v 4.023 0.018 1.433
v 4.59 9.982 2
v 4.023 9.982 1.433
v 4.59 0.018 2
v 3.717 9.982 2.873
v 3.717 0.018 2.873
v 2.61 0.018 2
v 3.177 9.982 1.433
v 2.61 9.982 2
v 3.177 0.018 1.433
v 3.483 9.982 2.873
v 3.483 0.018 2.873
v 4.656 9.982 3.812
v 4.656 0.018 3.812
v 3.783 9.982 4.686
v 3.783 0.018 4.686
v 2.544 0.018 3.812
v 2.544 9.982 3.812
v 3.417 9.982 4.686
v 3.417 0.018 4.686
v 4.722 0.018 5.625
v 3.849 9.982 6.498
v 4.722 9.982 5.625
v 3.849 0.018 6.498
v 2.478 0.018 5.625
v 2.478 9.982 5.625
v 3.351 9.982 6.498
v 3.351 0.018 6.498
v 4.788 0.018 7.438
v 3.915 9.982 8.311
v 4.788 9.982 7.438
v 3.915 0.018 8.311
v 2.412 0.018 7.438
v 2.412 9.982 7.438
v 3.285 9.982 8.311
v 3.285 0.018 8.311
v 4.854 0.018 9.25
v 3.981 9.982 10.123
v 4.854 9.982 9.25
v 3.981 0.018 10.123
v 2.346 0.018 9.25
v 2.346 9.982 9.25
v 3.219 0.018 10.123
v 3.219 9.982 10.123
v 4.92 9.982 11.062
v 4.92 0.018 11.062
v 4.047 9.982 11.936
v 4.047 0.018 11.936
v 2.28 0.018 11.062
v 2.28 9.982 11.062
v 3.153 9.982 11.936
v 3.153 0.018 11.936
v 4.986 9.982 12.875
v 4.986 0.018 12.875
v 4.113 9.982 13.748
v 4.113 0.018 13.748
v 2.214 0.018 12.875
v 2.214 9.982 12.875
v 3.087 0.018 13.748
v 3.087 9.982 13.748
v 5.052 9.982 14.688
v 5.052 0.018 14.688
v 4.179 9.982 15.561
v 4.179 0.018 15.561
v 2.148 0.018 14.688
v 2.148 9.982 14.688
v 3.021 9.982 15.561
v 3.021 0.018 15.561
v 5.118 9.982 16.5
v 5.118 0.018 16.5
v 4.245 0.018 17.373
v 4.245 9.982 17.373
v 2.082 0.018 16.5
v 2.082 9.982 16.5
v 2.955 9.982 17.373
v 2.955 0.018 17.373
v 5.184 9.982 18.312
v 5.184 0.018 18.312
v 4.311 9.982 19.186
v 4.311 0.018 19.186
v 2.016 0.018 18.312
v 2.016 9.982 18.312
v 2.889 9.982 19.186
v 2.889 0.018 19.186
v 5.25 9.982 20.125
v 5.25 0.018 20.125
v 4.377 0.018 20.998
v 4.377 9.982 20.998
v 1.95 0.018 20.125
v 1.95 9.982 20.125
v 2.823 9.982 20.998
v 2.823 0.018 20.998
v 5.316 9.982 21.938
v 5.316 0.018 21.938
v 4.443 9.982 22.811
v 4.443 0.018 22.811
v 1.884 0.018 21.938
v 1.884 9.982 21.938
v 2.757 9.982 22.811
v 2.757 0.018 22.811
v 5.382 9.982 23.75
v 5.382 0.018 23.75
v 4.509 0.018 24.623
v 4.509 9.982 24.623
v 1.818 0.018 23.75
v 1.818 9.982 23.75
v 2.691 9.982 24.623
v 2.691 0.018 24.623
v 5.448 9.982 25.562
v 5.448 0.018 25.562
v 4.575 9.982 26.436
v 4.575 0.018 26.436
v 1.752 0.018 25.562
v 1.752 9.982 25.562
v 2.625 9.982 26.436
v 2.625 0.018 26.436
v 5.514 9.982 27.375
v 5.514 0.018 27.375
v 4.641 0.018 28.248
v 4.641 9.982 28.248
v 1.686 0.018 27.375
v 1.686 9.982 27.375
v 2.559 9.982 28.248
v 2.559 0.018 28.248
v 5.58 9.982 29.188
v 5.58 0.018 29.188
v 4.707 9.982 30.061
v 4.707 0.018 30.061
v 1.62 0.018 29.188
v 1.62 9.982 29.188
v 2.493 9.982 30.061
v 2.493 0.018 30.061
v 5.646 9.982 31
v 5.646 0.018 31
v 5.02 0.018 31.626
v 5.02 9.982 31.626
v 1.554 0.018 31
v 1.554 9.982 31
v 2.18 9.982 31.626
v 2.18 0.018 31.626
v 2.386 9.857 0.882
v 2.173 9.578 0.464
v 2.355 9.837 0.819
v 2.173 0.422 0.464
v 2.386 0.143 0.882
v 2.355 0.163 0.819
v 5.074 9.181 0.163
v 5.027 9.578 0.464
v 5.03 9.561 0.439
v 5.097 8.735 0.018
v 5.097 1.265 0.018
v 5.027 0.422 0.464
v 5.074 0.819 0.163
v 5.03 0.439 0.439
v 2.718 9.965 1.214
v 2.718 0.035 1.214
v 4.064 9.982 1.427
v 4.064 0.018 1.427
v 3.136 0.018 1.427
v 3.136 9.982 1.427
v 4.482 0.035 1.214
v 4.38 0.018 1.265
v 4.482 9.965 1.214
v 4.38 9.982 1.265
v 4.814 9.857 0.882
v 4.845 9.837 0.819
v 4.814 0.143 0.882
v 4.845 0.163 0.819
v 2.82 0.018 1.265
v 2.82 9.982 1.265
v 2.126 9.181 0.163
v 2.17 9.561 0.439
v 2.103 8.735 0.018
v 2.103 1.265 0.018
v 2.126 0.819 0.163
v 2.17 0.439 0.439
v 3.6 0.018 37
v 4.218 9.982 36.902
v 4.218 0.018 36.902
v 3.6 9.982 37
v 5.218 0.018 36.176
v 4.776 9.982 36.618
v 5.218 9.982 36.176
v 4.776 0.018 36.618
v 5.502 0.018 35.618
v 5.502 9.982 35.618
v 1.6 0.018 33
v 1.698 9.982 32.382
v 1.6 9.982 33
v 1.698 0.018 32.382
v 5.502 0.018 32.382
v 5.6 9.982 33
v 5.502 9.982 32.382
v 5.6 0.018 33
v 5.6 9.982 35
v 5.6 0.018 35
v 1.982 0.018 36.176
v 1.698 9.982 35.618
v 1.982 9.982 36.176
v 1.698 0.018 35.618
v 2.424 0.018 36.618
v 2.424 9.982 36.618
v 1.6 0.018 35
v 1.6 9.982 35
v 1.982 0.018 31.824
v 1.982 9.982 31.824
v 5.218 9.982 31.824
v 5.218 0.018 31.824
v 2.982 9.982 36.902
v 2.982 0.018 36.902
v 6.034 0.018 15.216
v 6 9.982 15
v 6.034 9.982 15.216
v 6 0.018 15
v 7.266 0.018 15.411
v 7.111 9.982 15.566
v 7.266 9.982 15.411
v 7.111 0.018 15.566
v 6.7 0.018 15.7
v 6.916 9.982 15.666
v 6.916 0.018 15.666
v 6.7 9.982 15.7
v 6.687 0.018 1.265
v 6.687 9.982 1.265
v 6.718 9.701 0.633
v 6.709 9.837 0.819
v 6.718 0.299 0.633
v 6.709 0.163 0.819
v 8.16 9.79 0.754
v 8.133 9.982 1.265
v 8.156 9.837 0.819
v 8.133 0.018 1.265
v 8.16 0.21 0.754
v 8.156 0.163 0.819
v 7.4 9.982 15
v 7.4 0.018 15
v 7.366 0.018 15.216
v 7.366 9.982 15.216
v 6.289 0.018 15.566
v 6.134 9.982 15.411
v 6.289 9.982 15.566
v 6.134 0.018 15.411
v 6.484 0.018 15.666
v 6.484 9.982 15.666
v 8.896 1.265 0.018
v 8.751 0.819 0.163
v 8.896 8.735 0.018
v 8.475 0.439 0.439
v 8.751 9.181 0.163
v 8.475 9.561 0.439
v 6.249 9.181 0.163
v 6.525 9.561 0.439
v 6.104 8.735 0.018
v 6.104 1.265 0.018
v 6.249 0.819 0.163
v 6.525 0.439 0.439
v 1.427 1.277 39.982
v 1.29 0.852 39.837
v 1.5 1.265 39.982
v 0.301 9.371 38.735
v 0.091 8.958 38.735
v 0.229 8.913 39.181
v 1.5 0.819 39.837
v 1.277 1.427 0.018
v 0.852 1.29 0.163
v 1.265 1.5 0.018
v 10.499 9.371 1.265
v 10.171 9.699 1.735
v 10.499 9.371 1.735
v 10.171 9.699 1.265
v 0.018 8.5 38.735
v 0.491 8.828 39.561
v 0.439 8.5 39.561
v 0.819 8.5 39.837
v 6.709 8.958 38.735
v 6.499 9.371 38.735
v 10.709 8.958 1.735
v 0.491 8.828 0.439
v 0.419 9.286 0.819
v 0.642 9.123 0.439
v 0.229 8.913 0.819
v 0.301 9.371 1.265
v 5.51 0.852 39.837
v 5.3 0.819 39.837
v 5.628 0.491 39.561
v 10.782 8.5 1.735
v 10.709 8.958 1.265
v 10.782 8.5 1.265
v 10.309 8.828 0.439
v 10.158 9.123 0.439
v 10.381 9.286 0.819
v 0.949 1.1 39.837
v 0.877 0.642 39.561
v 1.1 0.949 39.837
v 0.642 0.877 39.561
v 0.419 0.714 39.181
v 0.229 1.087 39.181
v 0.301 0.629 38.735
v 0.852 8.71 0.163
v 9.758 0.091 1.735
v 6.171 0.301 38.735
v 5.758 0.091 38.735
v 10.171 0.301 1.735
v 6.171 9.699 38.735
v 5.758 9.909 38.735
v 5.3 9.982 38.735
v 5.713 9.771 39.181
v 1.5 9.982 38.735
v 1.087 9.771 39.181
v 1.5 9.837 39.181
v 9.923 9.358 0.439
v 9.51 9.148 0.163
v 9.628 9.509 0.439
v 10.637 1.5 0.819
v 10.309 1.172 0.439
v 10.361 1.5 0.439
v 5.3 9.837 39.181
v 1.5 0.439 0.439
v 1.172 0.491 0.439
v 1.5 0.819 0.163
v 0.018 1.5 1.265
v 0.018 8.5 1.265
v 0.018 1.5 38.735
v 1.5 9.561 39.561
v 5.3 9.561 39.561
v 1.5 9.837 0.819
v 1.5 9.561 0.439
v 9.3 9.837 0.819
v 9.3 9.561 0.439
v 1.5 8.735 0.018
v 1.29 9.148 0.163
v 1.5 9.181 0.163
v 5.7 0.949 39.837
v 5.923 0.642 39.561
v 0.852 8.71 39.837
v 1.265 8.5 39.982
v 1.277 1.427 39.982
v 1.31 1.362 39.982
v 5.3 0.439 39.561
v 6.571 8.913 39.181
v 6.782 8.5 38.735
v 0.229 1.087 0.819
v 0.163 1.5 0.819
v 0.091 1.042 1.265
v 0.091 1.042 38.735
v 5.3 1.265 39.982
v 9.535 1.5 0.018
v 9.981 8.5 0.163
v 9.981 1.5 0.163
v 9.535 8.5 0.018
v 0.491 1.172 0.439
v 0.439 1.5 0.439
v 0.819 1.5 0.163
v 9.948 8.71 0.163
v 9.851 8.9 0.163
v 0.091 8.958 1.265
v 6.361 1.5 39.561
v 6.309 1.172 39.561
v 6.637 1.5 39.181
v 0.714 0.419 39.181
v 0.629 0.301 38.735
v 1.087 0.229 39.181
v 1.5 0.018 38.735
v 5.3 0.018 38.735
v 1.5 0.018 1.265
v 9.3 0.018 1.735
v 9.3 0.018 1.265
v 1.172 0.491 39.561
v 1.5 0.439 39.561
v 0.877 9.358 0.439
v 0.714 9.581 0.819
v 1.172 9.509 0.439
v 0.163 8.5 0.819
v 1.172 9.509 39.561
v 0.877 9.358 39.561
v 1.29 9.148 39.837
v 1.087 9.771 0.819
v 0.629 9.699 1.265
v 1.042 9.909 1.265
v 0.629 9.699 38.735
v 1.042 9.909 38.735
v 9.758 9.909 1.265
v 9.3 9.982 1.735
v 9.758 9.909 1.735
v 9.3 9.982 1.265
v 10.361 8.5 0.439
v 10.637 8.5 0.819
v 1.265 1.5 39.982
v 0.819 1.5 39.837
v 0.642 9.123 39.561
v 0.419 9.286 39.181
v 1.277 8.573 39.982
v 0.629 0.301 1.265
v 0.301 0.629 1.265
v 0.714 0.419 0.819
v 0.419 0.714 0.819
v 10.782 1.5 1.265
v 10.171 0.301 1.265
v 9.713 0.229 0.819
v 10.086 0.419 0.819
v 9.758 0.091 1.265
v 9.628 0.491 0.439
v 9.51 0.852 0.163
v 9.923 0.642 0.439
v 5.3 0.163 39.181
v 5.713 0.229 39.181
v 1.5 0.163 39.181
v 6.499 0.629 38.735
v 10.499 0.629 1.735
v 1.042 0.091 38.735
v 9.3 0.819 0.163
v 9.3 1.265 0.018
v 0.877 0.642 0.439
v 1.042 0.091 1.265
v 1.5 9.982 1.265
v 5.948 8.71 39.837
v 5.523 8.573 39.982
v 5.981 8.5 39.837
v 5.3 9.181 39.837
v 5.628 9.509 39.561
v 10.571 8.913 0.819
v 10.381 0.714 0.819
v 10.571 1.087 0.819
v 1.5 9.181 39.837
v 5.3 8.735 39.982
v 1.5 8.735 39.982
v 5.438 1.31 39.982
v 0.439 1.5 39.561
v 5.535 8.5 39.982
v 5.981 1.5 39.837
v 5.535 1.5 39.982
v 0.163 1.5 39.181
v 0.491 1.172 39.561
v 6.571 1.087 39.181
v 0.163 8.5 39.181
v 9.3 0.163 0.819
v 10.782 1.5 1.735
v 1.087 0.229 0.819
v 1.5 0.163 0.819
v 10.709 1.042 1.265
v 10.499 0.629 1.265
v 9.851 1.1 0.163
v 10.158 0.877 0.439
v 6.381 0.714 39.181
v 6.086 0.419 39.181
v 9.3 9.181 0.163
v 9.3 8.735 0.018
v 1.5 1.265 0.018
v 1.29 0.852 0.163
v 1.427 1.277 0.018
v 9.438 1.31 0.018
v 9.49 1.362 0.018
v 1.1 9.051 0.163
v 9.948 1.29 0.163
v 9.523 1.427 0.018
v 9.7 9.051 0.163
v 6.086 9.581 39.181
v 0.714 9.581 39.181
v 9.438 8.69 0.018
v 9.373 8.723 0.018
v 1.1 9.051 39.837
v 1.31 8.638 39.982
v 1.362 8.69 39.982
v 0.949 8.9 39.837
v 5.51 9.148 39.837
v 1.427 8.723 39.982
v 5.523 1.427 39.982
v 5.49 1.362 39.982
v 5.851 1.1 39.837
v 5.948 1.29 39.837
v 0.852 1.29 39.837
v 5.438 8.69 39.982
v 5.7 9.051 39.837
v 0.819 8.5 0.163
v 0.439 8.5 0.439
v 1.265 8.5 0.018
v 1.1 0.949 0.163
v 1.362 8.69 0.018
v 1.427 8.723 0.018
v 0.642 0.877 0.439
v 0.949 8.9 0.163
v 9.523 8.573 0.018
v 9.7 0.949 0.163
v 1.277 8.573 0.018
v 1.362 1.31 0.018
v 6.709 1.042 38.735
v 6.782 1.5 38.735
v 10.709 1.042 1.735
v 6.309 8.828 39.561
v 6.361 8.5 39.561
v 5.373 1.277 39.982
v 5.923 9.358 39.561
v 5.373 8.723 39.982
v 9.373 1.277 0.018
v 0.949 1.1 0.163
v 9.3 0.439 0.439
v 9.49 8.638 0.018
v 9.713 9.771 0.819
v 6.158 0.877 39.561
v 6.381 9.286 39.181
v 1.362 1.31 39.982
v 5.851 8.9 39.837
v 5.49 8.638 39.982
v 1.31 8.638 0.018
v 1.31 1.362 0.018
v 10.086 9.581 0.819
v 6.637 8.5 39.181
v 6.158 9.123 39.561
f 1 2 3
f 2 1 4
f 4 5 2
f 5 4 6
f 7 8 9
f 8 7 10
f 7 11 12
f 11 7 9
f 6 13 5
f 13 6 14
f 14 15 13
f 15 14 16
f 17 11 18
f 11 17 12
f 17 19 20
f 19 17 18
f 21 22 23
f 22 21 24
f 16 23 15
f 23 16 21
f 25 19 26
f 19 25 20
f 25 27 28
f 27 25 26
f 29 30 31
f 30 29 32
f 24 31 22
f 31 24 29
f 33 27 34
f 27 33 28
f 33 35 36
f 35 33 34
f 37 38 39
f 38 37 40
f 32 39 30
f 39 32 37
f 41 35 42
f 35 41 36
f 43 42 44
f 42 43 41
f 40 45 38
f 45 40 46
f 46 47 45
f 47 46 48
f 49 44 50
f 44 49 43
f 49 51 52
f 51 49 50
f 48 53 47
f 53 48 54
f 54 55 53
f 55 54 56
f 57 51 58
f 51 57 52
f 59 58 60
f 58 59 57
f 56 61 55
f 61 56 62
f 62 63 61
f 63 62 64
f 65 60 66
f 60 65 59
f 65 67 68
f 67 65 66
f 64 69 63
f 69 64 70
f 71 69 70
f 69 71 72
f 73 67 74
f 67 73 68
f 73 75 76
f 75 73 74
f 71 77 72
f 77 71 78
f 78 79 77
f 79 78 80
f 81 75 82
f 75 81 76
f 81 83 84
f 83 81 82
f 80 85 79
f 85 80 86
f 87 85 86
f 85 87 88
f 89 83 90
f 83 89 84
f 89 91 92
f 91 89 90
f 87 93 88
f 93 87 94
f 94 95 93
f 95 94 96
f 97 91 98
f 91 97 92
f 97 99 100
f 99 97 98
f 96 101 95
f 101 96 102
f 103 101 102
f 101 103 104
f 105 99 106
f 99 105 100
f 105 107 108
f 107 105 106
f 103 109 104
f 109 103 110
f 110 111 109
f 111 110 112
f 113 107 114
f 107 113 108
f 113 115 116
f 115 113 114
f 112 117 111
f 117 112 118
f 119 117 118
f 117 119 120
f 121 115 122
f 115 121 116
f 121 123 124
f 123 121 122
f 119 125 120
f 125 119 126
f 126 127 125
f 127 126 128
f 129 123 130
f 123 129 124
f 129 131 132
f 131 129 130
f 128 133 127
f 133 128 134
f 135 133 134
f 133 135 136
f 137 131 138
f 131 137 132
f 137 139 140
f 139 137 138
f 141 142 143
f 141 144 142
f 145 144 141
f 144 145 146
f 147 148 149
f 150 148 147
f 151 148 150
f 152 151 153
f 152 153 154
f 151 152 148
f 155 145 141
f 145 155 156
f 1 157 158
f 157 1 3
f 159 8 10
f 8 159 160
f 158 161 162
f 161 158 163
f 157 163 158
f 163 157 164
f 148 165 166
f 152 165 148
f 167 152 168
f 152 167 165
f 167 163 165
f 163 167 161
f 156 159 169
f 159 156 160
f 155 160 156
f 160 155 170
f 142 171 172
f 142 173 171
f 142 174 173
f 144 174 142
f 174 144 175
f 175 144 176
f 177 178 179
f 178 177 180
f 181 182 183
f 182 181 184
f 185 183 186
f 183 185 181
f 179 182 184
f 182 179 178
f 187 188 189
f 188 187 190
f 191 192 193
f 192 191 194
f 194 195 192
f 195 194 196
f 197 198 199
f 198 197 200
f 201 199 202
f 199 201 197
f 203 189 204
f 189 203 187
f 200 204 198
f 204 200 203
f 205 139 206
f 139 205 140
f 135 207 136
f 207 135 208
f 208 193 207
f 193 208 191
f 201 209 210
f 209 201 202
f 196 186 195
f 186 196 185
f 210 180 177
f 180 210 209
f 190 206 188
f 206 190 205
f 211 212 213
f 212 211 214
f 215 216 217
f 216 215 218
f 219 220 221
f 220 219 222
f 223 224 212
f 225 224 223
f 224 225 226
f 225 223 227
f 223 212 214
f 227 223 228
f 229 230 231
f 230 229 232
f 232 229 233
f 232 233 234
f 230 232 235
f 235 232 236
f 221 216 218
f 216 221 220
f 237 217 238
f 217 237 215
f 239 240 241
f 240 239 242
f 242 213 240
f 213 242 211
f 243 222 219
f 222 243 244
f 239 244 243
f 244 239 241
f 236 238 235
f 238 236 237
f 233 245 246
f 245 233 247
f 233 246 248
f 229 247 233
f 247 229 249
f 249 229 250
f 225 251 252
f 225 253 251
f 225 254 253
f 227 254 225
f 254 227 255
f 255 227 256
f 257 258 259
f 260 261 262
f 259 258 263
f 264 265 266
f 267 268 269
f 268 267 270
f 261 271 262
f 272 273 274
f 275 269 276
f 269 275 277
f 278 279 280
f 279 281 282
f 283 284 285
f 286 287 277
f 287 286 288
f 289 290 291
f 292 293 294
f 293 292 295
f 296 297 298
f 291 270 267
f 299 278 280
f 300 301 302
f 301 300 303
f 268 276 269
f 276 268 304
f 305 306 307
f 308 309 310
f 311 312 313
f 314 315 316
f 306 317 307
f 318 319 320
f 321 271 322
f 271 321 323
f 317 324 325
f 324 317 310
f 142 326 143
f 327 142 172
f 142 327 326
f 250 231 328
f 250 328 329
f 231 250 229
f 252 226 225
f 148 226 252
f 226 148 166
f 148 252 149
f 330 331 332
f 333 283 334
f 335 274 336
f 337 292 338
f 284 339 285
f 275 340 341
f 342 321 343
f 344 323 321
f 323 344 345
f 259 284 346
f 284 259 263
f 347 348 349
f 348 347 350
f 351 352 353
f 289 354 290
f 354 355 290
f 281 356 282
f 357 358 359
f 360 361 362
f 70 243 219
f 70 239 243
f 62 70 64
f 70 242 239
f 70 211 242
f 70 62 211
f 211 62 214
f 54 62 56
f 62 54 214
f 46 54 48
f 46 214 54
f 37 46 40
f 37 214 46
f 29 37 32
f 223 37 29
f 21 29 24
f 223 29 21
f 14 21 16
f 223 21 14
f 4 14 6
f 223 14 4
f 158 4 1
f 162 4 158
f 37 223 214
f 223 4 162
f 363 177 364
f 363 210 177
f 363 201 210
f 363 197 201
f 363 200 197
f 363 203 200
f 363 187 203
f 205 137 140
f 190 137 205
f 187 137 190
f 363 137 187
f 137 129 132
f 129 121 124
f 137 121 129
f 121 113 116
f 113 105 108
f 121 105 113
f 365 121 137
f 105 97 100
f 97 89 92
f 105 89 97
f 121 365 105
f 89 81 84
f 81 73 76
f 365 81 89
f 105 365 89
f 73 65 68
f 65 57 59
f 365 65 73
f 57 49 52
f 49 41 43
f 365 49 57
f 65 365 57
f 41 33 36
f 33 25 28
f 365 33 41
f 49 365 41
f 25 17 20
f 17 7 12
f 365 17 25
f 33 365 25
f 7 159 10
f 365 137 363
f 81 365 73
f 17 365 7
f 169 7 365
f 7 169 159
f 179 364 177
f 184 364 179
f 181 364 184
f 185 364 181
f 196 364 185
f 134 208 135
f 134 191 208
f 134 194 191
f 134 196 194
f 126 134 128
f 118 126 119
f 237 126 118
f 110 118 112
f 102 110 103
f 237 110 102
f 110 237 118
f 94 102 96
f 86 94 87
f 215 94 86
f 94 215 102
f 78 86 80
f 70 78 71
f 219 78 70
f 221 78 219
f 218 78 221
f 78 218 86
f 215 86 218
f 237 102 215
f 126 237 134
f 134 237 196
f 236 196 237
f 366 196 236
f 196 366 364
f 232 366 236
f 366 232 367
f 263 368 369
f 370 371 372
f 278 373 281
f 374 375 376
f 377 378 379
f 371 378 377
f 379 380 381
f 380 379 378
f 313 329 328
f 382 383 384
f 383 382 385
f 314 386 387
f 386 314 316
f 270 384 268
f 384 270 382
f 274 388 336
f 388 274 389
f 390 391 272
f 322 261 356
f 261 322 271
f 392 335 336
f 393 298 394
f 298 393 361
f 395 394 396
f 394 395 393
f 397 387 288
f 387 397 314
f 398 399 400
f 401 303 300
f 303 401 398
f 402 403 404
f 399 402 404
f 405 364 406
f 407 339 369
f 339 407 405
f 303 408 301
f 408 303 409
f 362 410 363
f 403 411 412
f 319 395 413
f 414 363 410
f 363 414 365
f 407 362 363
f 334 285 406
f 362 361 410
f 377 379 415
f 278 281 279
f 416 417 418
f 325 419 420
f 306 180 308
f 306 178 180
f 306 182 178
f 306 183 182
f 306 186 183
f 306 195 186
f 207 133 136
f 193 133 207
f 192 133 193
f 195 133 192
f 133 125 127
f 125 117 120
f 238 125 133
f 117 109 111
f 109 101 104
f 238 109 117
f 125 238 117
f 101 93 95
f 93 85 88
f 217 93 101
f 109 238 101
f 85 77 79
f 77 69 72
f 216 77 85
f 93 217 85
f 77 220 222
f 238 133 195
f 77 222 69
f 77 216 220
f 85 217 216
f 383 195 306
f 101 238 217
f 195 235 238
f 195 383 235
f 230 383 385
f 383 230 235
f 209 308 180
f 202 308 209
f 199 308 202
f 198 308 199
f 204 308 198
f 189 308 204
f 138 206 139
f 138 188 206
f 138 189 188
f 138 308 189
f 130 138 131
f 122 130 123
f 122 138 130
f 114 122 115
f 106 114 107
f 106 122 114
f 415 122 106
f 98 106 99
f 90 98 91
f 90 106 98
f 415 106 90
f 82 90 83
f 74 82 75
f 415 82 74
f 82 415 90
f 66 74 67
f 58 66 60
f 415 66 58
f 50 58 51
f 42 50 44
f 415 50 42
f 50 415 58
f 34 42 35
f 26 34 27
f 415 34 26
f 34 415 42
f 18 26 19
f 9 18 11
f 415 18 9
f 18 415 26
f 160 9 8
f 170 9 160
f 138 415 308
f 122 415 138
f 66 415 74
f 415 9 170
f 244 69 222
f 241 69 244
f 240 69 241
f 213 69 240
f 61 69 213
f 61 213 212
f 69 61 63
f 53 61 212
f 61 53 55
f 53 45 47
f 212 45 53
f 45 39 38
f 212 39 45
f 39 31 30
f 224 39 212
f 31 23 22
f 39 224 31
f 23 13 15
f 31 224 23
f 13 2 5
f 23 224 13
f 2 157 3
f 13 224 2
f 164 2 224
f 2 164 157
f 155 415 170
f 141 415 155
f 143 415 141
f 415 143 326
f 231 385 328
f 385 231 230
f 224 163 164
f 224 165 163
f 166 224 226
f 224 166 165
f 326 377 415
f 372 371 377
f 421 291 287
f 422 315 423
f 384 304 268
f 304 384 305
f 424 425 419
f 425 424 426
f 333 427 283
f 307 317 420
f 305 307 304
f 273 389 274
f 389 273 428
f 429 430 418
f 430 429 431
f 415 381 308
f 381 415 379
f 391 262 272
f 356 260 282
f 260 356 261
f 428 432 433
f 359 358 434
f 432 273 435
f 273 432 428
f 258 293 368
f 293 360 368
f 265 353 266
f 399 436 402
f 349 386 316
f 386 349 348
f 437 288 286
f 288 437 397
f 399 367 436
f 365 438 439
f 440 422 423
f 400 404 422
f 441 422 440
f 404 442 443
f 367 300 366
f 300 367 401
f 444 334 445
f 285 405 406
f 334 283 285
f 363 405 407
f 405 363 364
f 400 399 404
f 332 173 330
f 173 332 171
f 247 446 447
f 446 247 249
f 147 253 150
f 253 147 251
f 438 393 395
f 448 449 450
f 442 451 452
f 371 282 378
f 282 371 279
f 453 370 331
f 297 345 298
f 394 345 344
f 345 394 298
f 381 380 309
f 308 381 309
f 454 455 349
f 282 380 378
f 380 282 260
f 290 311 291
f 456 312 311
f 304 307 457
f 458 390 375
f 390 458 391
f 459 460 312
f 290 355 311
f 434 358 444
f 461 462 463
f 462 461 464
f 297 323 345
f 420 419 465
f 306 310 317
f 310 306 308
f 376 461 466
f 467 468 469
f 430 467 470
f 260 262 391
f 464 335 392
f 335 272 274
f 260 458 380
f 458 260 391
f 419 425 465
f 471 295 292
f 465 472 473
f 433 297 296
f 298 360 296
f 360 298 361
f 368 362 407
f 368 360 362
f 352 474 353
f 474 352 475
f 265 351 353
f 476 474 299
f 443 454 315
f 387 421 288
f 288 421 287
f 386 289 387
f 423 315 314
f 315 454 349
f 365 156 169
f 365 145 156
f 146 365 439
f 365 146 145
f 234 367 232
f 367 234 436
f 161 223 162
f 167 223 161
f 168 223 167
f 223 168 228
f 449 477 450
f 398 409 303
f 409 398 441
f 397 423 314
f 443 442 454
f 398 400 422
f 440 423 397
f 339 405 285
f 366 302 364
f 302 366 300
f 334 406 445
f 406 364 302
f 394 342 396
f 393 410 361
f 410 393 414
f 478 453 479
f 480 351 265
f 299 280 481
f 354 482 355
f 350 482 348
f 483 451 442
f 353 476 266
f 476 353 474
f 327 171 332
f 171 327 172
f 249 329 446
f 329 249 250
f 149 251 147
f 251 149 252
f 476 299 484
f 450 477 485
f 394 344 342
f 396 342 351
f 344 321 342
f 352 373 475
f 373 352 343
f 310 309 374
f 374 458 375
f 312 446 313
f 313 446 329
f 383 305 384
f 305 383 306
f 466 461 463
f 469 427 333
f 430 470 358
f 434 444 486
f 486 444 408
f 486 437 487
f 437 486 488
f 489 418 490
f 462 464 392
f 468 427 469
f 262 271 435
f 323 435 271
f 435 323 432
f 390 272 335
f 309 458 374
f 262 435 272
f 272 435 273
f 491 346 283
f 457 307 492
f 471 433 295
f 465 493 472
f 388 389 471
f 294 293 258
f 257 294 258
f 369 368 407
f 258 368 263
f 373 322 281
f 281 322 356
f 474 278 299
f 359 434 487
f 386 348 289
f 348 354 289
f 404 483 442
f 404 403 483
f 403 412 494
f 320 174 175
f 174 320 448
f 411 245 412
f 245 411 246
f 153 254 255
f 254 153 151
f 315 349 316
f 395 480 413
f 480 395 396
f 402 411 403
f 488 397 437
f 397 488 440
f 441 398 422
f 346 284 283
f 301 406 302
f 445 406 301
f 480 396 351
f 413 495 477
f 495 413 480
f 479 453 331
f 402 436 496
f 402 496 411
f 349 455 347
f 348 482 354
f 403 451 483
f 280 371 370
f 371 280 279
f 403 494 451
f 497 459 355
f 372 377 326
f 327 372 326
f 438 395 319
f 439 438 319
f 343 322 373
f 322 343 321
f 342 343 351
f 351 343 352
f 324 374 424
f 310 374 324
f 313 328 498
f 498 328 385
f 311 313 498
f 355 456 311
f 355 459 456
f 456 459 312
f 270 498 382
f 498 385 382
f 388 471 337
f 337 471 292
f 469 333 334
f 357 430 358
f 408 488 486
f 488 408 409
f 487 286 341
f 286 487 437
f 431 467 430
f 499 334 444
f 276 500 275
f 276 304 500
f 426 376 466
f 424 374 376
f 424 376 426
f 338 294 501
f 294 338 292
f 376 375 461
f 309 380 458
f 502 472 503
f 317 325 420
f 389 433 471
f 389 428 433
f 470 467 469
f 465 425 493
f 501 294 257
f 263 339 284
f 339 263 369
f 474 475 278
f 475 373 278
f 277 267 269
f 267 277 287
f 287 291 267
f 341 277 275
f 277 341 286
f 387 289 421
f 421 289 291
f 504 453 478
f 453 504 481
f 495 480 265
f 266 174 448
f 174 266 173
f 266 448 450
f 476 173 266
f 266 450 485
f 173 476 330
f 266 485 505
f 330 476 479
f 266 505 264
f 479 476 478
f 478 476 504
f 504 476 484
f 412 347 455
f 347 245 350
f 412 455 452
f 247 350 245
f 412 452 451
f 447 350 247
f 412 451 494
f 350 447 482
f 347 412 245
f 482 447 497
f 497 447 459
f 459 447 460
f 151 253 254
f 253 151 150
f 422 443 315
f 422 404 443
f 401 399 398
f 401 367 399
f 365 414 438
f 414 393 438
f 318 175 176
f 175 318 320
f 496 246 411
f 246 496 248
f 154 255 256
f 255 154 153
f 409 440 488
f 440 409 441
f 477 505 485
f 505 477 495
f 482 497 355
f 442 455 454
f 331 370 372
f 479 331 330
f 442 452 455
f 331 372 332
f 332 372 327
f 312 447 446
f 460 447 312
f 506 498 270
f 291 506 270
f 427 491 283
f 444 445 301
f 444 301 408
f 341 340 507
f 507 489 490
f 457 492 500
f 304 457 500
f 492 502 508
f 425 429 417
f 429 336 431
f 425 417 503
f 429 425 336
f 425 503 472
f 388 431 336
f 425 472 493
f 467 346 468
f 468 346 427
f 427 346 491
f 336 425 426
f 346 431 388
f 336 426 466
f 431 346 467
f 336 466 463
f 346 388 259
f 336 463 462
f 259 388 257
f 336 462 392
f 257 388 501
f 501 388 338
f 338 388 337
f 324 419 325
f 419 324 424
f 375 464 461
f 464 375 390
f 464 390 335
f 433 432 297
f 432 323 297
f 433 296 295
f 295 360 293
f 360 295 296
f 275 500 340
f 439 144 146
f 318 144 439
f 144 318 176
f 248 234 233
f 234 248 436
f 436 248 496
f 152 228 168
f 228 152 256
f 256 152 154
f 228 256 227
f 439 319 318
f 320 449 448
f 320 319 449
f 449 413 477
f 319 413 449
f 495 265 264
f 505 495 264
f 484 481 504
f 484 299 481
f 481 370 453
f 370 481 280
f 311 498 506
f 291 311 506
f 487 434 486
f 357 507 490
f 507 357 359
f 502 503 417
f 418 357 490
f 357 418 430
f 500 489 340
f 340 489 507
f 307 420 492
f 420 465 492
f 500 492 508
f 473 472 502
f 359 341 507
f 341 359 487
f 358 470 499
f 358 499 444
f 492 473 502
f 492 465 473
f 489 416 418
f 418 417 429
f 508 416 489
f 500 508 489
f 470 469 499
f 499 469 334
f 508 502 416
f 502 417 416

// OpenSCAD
$fn = 20;
r = 1.5;
length = 10;
height = 40;
width = 6.8;
hook = 4;
hole = 2.8;

module block() {
	hull() {
		translate([r, r, r]) sphere(r);
		translate([r, length - r, r]) sphere(r);
		translate([r, length - r, height - r]) sphere(r);
		translate([r, r, height - r]) sphere(r);

		translate([width + hook - r, r, r]) sphere(r);
		translate([width + hook - r, length - r, r]) sphere(r);
		translate([width - r, length - r, height - r]) sphere(r);
		translate([width - r, r, height - r]) sphere(r);
	}
}

module tooth(i) {
	size = hole * (15 + i)/30;
	rotate([0, 45, 0]) cube([size, length + 0.02, size], center=true);
}

module saw() {
	numPieces = 16;
	for (i = [0:numPieces]) {
		translate([0, length/2, 2 + i * (height-11)/numPieces]) tooth(i);
	}
	translate([0, length/2, 0]) rotate([90, 0, 0]) cylinder(r=1.5, h=length+0.02, center=true);
	translate([0, length/2, 33]) rotate([90, 0, 0]) hull() {
		cylinder(r=2, h=length+0.02, center=true);
		translate([0, 2, 0]) cylinder(r=2, h=length+0.02, center=true);
	}
}

module ridge() {
	hull() {
		translate([0, length+0.01, 15]) rotate([90, 0, 0]) cylinder(r=0.7, length + 0.02);
		translate([0.1, -0.01, -1]) cube([2*0.7, length+0.02, 1]);
	}
	translate([0.8, length/2, 0]) rotate([0, 45, 0]) cube([2, length + 0.02, 2], center=true);
}

difference() {
	block();
	translate([3.6, 0, 0]) saw();
	translate([6.7, 0, 0]) ridge();
}
